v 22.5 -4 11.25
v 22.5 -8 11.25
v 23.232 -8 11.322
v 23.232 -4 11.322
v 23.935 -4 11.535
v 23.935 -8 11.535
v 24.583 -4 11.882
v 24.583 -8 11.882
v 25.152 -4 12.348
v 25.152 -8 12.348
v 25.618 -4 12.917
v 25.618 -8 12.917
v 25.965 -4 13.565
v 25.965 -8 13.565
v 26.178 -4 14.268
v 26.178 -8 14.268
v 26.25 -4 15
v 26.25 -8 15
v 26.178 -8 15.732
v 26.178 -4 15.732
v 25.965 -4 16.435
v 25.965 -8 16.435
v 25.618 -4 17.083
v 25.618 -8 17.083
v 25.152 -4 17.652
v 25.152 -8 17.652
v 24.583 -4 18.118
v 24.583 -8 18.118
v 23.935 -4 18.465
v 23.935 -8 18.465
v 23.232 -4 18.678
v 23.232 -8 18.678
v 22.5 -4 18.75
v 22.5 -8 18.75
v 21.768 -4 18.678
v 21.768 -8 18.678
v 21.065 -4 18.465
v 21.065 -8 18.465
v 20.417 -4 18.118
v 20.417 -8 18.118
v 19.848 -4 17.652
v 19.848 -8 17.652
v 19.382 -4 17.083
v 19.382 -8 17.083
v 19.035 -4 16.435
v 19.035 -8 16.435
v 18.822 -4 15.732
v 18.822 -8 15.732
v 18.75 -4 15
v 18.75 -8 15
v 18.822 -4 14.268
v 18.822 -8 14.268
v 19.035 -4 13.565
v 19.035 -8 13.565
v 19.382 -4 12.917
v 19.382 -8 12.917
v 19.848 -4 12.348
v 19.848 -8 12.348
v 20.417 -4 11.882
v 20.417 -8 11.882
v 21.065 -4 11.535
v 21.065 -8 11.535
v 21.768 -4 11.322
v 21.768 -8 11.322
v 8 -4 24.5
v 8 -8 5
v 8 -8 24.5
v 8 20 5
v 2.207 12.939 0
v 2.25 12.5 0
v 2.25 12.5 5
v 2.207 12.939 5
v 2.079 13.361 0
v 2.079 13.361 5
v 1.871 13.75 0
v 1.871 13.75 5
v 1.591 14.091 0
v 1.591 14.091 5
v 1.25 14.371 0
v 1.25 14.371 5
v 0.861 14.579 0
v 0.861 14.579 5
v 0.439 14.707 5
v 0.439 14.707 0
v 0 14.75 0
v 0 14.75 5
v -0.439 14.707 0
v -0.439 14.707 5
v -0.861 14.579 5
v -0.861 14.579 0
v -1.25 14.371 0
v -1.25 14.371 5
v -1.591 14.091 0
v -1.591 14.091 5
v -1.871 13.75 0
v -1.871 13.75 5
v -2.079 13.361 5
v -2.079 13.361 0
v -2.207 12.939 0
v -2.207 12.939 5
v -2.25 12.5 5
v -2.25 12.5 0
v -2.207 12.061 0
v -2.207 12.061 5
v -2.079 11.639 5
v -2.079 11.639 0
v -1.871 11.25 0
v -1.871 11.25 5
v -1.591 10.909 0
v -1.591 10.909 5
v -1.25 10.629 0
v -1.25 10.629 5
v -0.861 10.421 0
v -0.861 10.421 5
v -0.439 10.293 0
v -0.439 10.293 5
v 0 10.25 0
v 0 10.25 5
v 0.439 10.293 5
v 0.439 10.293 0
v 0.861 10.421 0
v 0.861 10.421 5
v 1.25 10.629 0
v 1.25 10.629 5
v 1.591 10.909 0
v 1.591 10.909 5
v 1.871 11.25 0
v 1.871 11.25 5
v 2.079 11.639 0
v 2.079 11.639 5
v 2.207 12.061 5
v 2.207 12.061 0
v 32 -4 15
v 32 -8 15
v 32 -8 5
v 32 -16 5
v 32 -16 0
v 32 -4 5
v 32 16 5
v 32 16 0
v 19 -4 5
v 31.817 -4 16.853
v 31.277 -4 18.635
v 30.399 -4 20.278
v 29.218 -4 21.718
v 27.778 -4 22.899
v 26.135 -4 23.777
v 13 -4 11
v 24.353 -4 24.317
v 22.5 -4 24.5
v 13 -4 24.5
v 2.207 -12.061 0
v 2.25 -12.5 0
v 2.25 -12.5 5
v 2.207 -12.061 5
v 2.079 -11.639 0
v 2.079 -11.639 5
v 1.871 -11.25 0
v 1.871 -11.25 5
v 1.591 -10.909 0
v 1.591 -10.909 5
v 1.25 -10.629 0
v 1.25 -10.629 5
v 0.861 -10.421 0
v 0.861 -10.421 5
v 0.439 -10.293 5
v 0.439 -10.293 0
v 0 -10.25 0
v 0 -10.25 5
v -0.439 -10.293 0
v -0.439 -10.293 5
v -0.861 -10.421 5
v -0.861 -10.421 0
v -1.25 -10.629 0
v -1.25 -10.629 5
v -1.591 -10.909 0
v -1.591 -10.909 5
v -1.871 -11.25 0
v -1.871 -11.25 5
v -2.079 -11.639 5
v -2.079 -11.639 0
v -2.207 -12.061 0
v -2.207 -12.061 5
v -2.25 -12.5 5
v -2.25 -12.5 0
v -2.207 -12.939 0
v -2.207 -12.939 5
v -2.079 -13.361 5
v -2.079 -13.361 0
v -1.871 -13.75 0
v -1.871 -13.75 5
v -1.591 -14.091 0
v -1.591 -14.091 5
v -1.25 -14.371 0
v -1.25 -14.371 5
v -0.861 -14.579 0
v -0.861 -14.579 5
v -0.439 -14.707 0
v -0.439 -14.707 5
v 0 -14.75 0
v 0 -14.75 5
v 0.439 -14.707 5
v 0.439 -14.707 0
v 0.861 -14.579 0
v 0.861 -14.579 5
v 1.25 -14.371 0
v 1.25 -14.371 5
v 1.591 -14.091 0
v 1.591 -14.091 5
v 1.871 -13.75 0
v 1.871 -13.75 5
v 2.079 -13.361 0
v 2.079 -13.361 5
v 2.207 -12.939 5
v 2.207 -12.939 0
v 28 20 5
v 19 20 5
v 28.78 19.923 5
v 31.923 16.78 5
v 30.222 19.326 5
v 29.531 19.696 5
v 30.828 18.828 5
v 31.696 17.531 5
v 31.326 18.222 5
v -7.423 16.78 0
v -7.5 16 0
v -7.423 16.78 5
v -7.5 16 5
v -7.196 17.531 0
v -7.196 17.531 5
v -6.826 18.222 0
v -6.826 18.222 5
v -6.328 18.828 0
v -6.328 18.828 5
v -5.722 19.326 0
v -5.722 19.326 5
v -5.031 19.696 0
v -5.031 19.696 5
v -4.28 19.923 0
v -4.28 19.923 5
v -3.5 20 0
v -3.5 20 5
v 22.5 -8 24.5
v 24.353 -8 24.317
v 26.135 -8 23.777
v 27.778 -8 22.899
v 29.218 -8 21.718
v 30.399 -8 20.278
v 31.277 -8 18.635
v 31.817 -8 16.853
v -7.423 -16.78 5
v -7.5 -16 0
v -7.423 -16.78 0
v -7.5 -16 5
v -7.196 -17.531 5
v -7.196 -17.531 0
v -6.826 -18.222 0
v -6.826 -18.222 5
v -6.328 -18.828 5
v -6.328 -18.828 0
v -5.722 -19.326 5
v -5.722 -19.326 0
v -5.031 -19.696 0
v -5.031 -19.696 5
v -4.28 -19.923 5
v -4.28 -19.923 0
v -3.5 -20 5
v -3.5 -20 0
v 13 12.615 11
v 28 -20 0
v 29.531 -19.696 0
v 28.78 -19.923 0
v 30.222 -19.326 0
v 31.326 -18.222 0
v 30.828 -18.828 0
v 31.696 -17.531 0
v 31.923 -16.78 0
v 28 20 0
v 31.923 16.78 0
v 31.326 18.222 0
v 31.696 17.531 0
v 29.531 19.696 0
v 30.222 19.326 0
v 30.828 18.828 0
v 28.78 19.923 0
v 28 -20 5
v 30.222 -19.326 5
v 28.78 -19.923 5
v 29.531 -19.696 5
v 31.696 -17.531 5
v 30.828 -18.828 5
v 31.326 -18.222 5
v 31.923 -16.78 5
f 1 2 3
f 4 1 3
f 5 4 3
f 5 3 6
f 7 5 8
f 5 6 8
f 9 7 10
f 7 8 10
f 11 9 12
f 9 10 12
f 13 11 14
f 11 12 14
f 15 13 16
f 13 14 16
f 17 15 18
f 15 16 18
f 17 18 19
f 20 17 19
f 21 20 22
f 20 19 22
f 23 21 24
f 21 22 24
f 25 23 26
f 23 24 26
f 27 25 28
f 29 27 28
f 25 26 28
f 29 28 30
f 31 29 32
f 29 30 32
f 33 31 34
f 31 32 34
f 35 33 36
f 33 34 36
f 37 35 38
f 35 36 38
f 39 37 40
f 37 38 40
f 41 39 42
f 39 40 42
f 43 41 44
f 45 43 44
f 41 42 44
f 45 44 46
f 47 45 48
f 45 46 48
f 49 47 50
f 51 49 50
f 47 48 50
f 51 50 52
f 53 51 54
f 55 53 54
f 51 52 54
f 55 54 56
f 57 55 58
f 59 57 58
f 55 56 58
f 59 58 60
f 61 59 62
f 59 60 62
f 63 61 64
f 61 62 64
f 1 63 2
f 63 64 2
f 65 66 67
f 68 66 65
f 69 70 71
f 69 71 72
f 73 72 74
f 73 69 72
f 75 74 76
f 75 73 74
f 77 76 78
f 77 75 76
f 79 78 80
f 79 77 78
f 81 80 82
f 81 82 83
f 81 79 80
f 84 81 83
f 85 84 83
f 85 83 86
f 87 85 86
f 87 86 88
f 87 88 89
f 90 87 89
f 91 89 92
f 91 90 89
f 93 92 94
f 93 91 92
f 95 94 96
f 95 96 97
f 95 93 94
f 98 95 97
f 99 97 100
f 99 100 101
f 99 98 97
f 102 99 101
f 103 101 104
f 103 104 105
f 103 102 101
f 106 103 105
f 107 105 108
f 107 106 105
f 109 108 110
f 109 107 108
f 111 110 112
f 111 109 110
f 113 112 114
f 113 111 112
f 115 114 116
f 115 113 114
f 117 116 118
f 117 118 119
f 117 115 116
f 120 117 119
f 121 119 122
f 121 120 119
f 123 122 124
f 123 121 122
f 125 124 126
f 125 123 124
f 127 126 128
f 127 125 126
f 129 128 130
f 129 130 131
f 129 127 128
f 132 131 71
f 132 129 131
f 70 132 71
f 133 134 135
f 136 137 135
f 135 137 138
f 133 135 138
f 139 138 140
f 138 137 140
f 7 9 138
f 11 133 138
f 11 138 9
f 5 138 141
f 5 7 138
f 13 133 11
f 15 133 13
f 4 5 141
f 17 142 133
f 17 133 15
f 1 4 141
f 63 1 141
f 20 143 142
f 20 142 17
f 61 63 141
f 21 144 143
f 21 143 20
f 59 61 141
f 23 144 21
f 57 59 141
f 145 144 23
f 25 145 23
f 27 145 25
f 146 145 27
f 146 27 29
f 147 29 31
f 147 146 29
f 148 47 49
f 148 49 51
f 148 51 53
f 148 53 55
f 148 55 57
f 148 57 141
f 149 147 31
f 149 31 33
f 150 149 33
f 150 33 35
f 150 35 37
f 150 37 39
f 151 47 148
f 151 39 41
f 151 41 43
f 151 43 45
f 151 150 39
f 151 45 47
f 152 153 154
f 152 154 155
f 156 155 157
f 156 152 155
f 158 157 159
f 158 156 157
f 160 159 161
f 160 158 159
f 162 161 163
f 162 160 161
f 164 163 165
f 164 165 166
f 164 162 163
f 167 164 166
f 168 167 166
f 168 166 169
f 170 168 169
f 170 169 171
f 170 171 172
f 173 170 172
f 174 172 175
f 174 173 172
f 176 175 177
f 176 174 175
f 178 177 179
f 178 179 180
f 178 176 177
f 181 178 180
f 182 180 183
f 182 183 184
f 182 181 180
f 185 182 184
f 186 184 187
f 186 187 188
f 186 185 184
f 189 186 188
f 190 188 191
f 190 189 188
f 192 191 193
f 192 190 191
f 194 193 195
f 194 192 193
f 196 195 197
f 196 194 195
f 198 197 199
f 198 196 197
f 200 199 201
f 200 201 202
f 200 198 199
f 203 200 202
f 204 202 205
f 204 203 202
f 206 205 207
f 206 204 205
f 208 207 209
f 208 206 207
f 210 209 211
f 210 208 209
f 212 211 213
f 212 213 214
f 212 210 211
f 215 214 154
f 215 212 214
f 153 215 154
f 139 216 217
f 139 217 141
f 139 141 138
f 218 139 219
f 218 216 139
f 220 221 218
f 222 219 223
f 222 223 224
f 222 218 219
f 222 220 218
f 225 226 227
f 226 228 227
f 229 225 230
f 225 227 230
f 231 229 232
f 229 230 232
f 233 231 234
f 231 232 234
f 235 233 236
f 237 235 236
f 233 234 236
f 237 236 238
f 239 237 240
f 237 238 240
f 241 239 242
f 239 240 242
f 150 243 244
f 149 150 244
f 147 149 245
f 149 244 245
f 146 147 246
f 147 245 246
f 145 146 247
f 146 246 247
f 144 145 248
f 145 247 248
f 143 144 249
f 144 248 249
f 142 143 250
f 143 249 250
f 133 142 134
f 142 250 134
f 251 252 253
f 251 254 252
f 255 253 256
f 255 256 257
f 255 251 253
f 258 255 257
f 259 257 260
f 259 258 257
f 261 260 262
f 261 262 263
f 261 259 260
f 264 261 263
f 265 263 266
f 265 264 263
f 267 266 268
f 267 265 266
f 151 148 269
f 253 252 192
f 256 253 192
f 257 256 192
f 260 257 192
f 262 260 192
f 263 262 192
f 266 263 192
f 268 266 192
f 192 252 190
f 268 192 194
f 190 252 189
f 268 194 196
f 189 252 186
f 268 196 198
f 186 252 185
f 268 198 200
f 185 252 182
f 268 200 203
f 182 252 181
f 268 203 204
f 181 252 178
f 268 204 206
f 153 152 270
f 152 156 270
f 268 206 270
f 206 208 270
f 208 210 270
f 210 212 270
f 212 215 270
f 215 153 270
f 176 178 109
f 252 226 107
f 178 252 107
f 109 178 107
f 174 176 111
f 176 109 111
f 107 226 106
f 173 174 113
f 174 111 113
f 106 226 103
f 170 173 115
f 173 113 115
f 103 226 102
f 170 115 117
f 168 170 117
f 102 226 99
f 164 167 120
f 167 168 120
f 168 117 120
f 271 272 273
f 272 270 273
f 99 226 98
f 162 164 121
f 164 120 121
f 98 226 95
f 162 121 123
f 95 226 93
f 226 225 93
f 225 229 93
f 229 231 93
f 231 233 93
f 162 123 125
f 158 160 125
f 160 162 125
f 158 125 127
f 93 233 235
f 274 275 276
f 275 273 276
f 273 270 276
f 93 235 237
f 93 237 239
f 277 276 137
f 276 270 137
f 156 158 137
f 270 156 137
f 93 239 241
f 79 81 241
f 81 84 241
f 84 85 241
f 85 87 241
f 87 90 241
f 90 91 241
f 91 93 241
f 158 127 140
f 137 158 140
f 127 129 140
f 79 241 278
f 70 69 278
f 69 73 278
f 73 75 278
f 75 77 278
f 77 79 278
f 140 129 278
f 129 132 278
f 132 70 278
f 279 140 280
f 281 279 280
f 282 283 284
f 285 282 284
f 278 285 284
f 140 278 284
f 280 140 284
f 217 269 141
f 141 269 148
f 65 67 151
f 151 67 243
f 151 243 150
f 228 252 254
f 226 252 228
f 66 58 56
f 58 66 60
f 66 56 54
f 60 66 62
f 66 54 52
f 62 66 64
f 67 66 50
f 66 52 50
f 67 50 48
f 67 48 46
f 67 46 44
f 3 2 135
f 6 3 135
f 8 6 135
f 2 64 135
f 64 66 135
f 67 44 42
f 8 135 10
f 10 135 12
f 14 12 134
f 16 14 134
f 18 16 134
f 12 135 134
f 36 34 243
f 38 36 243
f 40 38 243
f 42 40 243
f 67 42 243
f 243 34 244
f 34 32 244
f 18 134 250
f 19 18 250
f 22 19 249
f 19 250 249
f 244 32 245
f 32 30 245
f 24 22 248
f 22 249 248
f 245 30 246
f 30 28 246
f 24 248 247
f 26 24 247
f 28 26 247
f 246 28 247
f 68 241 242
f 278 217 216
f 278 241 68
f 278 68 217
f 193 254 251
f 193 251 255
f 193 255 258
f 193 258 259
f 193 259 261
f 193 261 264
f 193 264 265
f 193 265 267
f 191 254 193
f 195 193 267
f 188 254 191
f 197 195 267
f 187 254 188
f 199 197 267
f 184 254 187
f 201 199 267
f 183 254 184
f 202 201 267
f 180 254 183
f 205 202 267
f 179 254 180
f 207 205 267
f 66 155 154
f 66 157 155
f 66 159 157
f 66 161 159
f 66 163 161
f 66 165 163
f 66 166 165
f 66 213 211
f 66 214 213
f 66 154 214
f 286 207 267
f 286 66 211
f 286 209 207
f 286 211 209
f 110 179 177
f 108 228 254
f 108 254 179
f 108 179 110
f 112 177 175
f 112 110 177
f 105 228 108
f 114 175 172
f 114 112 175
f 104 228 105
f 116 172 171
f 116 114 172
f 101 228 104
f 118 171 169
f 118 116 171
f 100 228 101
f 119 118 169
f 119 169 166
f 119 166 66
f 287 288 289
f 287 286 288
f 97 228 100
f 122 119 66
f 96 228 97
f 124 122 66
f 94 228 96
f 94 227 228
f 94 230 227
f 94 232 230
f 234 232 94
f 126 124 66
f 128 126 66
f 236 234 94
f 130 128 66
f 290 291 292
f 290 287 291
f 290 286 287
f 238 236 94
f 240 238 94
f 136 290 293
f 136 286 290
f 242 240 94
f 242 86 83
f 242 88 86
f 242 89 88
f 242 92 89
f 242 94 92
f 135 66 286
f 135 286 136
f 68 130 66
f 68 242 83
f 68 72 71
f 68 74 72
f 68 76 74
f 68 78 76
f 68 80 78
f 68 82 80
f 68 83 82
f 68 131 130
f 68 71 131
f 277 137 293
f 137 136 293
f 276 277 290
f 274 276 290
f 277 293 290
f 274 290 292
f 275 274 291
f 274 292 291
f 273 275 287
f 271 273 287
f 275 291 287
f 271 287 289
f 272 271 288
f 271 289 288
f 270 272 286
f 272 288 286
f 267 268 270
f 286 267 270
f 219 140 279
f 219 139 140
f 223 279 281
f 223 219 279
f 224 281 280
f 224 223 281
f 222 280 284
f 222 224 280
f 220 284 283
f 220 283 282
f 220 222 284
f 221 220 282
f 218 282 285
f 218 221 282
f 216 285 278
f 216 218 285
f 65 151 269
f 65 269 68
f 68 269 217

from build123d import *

# Parameters (mm, degrees)
SKETCH1_W           = 39.5
SKETCH1_H           = 40
SKETCH1_R           = 2.25
BOSS_EXTRUDE1_DEPTH = 5
BOSS_EXTRUDE2_START = -12
SKETCH2_R           = 3.75
BOSS_EXTRUDE2_DEPTH = 4
BOSS_EXTRUDE3_DEPTH = 5
FILLET1_R           = 4
CHAMFER2_SIZE       = 6


with BuildPart() as part:
    # Sketch1 → Boss-Extrude1 (new body)
    with BuildSketch(Plane.XY):
        with Locations((12.25, 0)):
            Rectangle(SKETCH1_W, SKETCH1_H)
        with Locations((0, 12.5)):
            Circle(SKETCH1_R, mode=Mode.SUBTRACT)
        with Locations((0, -12.5)):
            Circle(SKETCH1_R, mode=Mode.SUBTRACT)
    extrude(amount=BOSS_EXTRUDE1_DEPTH)

    # Sketch2 → Boss-Extrude2 (add)
    with BuildSketch(Plane.XZ.offset(20).offset(BOSS_EXTRUDE2_START)):
        with BuildLine():
            Line((32, 5), (13, 5))
            Line((13, 5), (13, 24.5))
            Line((13, 24.5), (22.5, 24.5))
            ThreePointArc((22.5, 24.5), (29.217514421, 21.717514421), (32, 15))
            Line((32, 15), (32, 5))
        make_face()
        with Locations(Location((22.5, 15, 0), (0, 0, 270))):
            Circle(SKETCH2_R, mode=Mode.SUBTRACT)
    extrude(amount=-BOSS_EXTRUDE2_DEPTH)

    # Sketch3 → Boss-Extrude3 (add)
    with BuildSketch(Plane.ZY.offset(-13)):
        Polygon((24.5, -4), (5, 20), (5, -4), (5, -8), (24.5, -8), align=None)
    extrude(amount=BOSS_EXTRUDE3_DEPTH)

    # Fillet1
    fillet1_edges = [part.edges().sort_by_distance(p)[0] for p in [
        (32, 20, 2.5),
        (-7.5, -20, 2.5),
        (-7.5, 20, 2.5),
        (32, -20, 2.5),
    ]]
    fillet(fillet1_edges, radius=FILLET1_R)

    # Chamfer2
    chamfer2_edges = [part.edges().sort_by_distance(p)[0] for p in [
        (13, 8, 5),
    ]]
    chamfer(chamfer2_edges, length=CHAMFER2_SIZE)


solid = part.part
